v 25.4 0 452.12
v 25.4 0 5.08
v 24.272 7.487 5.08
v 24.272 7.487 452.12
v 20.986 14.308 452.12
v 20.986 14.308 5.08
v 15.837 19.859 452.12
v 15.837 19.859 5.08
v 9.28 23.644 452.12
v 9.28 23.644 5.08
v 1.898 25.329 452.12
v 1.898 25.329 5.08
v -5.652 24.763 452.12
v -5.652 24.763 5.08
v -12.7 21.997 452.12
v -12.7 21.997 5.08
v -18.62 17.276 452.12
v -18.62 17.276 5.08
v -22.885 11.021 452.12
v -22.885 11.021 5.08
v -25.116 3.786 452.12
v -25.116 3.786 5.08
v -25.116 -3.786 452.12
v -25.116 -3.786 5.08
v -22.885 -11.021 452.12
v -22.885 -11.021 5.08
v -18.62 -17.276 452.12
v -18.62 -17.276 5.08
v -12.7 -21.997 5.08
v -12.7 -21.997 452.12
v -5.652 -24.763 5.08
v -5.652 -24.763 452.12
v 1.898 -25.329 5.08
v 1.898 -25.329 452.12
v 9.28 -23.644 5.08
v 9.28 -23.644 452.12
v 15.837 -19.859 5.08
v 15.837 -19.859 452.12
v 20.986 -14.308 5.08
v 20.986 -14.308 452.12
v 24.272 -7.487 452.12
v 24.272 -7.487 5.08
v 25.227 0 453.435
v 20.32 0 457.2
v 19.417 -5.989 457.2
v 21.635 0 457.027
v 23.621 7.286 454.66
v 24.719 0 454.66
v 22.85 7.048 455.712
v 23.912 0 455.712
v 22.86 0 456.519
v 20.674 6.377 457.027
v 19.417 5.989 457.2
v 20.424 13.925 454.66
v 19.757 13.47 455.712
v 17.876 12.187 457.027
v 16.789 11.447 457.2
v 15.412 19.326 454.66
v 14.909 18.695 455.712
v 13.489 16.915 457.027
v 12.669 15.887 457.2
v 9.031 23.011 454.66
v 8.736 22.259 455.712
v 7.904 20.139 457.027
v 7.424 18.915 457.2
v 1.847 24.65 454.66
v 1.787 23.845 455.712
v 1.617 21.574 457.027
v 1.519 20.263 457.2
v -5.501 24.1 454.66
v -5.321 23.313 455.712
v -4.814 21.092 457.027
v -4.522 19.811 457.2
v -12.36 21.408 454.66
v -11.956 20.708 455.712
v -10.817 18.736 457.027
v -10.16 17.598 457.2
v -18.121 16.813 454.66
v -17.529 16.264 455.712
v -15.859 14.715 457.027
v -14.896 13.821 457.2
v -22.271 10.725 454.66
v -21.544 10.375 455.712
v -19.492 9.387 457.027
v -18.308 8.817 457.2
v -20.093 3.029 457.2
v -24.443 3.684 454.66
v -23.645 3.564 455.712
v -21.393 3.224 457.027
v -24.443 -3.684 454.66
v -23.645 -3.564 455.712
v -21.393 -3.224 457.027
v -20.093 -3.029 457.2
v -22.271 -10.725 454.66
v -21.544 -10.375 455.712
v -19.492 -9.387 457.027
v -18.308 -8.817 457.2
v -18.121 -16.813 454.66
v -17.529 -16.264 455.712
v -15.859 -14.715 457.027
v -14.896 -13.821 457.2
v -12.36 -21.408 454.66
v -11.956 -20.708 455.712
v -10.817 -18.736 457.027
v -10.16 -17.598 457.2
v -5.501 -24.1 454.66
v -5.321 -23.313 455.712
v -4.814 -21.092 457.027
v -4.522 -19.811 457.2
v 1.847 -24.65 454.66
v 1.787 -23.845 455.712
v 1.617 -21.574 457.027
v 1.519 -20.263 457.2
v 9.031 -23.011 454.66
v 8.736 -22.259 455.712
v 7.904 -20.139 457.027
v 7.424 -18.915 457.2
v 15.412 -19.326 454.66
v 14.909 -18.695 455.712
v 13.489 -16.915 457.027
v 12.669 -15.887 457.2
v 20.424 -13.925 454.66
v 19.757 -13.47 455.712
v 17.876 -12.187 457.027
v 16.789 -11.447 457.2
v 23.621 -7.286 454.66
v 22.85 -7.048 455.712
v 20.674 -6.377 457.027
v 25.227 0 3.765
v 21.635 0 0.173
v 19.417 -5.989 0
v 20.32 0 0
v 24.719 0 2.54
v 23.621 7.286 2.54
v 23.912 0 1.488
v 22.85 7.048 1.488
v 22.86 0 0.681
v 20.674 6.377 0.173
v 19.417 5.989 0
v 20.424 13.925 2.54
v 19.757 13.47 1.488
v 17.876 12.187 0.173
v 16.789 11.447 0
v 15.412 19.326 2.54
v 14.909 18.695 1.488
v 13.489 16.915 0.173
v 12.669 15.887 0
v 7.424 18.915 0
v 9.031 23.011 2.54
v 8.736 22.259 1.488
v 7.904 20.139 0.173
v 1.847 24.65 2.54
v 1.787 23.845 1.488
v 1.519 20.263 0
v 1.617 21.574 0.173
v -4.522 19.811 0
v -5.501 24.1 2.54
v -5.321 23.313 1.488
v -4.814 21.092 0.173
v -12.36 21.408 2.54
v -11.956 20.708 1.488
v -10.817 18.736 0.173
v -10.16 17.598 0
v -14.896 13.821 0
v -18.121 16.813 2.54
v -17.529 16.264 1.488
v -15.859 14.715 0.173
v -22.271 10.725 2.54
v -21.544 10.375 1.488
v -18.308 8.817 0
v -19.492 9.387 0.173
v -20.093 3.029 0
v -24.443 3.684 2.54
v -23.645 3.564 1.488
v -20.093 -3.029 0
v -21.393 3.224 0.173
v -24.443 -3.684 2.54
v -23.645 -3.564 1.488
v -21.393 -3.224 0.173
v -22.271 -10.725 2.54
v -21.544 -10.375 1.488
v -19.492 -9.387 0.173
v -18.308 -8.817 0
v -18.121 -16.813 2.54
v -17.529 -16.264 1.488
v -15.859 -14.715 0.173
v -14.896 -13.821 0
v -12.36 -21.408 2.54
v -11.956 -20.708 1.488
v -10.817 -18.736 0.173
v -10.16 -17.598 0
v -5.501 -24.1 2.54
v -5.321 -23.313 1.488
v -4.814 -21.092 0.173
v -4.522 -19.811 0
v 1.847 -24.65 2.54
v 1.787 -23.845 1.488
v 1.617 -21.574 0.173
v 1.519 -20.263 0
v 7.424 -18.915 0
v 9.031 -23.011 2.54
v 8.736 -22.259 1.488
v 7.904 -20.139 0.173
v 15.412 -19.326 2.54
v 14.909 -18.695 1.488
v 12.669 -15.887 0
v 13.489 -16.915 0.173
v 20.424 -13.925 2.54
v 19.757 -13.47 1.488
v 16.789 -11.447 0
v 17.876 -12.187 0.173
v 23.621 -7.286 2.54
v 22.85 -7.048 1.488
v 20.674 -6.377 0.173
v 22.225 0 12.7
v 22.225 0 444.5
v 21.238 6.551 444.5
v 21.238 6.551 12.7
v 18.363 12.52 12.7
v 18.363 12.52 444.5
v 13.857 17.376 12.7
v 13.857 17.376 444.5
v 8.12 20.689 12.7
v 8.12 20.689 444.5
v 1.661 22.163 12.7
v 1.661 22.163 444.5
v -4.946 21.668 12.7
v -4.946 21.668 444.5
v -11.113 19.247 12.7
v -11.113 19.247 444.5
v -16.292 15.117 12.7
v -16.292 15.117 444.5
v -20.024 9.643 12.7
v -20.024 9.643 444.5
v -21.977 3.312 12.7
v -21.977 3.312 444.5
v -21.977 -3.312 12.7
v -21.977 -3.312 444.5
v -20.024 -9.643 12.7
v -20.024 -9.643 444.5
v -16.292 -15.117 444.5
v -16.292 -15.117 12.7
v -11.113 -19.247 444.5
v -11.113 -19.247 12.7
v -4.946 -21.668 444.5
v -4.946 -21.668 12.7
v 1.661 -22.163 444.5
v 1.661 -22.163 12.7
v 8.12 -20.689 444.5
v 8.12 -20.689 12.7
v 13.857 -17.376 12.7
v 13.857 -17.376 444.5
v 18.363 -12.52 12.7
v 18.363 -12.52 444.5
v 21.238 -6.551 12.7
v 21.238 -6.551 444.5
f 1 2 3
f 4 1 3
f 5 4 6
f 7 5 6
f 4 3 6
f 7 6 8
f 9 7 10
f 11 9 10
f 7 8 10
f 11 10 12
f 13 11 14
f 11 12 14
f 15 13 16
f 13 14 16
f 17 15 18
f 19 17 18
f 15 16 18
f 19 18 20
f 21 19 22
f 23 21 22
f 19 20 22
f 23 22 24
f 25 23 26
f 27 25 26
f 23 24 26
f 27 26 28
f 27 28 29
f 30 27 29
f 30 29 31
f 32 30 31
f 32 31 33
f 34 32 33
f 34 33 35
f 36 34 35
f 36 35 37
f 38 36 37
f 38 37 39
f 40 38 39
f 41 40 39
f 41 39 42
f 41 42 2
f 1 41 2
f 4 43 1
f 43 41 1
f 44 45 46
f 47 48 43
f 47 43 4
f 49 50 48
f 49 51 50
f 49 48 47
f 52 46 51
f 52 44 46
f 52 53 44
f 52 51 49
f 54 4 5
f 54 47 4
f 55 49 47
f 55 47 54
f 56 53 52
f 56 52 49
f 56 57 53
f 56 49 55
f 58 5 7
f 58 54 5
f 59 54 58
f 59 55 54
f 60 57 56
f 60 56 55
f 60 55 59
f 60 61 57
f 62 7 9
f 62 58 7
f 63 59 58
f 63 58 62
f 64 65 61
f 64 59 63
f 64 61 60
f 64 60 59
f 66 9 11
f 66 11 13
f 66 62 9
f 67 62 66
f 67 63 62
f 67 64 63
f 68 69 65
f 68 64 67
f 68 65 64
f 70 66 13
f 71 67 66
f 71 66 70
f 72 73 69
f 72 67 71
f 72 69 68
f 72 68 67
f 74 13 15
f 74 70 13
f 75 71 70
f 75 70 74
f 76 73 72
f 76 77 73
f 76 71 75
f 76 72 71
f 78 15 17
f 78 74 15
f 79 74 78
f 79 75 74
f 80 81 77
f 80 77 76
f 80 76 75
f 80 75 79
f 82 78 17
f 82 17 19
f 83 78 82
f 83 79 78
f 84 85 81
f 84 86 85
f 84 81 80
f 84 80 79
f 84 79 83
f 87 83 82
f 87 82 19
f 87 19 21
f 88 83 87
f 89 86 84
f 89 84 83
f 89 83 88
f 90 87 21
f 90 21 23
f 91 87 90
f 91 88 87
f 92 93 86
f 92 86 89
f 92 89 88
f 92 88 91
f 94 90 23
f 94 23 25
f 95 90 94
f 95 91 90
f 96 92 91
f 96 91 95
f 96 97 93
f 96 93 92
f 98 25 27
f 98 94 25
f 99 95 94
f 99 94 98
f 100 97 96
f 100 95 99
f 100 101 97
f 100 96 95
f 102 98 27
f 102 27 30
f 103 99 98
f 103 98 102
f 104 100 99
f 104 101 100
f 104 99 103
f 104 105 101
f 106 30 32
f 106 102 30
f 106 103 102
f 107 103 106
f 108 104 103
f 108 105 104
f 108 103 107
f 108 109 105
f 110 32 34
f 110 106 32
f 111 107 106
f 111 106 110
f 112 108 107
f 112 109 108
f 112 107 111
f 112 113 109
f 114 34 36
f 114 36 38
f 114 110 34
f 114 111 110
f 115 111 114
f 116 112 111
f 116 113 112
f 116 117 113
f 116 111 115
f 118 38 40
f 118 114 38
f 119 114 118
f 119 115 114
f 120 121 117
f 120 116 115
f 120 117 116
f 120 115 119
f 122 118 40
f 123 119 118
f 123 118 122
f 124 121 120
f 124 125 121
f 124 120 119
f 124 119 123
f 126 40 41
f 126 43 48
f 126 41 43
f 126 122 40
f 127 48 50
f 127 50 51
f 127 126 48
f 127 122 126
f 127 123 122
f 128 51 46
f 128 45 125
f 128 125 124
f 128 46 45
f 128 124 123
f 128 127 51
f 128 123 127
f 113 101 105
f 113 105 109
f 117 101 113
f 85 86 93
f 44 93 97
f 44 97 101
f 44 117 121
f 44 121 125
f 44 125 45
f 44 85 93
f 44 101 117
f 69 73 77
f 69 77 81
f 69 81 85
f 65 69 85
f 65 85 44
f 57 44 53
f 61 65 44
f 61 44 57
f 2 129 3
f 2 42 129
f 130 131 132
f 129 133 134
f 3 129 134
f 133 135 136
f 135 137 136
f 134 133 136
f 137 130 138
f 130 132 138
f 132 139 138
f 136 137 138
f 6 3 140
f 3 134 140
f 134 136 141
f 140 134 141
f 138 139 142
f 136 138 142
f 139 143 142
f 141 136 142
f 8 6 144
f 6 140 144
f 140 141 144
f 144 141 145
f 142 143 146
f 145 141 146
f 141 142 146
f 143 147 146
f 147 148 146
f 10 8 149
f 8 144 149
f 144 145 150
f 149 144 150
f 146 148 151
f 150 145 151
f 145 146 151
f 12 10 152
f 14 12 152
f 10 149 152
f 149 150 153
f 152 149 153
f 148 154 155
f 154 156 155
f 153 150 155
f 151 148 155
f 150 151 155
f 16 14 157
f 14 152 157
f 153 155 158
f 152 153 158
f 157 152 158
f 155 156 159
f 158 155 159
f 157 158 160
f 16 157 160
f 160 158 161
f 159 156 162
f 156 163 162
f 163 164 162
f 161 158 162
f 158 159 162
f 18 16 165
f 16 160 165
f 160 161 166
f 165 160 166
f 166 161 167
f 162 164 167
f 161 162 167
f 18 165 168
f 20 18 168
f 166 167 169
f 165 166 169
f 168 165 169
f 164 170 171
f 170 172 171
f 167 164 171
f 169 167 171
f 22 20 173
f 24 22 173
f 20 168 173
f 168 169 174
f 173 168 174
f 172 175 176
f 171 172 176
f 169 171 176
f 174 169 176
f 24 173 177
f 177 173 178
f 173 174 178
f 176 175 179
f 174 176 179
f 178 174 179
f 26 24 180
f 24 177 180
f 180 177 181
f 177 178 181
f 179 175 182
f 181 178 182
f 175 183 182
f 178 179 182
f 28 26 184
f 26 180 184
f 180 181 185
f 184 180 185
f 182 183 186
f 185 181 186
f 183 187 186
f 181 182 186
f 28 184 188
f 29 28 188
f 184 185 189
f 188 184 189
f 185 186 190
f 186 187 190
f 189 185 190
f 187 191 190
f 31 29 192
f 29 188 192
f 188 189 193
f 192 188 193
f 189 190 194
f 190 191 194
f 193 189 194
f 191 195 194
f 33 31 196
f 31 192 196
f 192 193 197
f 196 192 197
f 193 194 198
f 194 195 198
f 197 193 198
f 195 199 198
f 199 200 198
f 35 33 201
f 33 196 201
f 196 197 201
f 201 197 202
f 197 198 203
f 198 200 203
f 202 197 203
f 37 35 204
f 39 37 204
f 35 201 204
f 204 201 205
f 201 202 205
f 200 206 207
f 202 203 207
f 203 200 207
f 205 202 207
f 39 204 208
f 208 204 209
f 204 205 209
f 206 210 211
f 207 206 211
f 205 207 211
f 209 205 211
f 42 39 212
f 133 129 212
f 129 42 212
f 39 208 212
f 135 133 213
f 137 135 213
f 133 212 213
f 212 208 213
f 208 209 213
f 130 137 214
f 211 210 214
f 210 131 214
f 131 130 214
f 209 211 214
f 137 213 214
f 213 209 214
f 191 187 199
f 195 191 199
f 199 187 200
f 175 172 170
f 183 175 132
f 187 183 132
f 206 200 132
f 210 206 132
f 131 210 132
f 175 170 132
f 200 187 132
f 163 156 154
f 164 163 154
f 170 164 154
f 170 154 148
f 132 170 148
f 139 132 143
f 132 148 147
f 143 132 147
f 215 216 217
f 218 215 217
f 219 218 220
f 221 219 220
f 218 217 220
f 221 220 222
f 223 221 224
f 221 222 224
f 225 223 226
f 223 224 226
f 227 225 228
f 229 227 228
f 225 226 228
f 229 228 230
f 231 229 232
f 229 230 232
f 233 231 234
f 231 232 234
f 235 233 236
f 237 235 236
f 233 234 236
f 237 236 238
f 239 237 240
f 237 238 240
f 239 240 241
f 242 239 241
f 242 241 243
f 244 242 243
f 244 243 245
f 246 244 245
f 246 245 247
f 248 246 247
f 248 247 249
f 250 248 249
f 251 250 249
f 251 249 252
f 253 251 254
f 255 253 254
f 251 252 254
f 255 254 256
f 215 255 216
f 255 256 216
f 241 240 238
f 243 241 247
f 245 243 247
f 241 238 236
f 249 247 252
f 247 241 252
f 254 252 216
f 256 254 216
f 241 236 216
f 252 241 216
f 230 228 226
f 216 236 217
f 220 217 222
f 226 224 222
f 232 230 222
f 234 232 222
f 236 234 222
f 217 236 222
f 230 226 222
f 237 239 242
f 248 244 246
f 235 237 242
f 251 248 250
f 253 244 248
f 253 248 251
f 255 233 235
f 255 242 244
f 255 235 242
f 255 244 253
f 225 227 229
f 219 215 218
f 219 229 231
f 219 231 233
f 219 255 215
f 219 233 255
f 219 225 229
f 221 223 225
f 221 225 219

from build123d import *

# Parameters (mm, degrees)
F0_R     = 25.4
F1_DEPTH = 444.5
F2_R     = 22.225
F3_DEPTH = 431.8
F4_R     = 25.4
F5_DEPTH = 12.7
F6_R     = 5.08
F7_R     = 5.08


with BuildPart() as f1:
    # F0 (on Top) → F1 (new body)
    with BuildSketch(Plane.XY):
        Circle(F0_R)
    extrude(amount=F1_DEPTH)

    # F2 (on face) → F3 (cut)
    with BuildSketch(Plane.XY.offset(444.5)):
        Circle(F2_R)
    extrude(amount=-F3_DEPTH, mode=Mode.SUBTRACT)

    # F4 (on face) → F5 (join)
    with BuildSketch(Plane.XY.offset(444.5)):
        Circle(F4_R)
    extrude(amount=F5_DEPTH)

    # F6
    f6_edges = [f1.edges().sort_by_distance(p)[0] for p in [
        (-25.4, 0, 457.2),
    ]]
    fillet(f6_edges, radius=F6_R)

    # F7
    f7_edges = [f1.edges().sort_by_distance(p)[0] for p in [
        (-25.4, 0, 0),
    ]]
    fillet(f7_edges, radius=F7_R)


solid = f1.part
